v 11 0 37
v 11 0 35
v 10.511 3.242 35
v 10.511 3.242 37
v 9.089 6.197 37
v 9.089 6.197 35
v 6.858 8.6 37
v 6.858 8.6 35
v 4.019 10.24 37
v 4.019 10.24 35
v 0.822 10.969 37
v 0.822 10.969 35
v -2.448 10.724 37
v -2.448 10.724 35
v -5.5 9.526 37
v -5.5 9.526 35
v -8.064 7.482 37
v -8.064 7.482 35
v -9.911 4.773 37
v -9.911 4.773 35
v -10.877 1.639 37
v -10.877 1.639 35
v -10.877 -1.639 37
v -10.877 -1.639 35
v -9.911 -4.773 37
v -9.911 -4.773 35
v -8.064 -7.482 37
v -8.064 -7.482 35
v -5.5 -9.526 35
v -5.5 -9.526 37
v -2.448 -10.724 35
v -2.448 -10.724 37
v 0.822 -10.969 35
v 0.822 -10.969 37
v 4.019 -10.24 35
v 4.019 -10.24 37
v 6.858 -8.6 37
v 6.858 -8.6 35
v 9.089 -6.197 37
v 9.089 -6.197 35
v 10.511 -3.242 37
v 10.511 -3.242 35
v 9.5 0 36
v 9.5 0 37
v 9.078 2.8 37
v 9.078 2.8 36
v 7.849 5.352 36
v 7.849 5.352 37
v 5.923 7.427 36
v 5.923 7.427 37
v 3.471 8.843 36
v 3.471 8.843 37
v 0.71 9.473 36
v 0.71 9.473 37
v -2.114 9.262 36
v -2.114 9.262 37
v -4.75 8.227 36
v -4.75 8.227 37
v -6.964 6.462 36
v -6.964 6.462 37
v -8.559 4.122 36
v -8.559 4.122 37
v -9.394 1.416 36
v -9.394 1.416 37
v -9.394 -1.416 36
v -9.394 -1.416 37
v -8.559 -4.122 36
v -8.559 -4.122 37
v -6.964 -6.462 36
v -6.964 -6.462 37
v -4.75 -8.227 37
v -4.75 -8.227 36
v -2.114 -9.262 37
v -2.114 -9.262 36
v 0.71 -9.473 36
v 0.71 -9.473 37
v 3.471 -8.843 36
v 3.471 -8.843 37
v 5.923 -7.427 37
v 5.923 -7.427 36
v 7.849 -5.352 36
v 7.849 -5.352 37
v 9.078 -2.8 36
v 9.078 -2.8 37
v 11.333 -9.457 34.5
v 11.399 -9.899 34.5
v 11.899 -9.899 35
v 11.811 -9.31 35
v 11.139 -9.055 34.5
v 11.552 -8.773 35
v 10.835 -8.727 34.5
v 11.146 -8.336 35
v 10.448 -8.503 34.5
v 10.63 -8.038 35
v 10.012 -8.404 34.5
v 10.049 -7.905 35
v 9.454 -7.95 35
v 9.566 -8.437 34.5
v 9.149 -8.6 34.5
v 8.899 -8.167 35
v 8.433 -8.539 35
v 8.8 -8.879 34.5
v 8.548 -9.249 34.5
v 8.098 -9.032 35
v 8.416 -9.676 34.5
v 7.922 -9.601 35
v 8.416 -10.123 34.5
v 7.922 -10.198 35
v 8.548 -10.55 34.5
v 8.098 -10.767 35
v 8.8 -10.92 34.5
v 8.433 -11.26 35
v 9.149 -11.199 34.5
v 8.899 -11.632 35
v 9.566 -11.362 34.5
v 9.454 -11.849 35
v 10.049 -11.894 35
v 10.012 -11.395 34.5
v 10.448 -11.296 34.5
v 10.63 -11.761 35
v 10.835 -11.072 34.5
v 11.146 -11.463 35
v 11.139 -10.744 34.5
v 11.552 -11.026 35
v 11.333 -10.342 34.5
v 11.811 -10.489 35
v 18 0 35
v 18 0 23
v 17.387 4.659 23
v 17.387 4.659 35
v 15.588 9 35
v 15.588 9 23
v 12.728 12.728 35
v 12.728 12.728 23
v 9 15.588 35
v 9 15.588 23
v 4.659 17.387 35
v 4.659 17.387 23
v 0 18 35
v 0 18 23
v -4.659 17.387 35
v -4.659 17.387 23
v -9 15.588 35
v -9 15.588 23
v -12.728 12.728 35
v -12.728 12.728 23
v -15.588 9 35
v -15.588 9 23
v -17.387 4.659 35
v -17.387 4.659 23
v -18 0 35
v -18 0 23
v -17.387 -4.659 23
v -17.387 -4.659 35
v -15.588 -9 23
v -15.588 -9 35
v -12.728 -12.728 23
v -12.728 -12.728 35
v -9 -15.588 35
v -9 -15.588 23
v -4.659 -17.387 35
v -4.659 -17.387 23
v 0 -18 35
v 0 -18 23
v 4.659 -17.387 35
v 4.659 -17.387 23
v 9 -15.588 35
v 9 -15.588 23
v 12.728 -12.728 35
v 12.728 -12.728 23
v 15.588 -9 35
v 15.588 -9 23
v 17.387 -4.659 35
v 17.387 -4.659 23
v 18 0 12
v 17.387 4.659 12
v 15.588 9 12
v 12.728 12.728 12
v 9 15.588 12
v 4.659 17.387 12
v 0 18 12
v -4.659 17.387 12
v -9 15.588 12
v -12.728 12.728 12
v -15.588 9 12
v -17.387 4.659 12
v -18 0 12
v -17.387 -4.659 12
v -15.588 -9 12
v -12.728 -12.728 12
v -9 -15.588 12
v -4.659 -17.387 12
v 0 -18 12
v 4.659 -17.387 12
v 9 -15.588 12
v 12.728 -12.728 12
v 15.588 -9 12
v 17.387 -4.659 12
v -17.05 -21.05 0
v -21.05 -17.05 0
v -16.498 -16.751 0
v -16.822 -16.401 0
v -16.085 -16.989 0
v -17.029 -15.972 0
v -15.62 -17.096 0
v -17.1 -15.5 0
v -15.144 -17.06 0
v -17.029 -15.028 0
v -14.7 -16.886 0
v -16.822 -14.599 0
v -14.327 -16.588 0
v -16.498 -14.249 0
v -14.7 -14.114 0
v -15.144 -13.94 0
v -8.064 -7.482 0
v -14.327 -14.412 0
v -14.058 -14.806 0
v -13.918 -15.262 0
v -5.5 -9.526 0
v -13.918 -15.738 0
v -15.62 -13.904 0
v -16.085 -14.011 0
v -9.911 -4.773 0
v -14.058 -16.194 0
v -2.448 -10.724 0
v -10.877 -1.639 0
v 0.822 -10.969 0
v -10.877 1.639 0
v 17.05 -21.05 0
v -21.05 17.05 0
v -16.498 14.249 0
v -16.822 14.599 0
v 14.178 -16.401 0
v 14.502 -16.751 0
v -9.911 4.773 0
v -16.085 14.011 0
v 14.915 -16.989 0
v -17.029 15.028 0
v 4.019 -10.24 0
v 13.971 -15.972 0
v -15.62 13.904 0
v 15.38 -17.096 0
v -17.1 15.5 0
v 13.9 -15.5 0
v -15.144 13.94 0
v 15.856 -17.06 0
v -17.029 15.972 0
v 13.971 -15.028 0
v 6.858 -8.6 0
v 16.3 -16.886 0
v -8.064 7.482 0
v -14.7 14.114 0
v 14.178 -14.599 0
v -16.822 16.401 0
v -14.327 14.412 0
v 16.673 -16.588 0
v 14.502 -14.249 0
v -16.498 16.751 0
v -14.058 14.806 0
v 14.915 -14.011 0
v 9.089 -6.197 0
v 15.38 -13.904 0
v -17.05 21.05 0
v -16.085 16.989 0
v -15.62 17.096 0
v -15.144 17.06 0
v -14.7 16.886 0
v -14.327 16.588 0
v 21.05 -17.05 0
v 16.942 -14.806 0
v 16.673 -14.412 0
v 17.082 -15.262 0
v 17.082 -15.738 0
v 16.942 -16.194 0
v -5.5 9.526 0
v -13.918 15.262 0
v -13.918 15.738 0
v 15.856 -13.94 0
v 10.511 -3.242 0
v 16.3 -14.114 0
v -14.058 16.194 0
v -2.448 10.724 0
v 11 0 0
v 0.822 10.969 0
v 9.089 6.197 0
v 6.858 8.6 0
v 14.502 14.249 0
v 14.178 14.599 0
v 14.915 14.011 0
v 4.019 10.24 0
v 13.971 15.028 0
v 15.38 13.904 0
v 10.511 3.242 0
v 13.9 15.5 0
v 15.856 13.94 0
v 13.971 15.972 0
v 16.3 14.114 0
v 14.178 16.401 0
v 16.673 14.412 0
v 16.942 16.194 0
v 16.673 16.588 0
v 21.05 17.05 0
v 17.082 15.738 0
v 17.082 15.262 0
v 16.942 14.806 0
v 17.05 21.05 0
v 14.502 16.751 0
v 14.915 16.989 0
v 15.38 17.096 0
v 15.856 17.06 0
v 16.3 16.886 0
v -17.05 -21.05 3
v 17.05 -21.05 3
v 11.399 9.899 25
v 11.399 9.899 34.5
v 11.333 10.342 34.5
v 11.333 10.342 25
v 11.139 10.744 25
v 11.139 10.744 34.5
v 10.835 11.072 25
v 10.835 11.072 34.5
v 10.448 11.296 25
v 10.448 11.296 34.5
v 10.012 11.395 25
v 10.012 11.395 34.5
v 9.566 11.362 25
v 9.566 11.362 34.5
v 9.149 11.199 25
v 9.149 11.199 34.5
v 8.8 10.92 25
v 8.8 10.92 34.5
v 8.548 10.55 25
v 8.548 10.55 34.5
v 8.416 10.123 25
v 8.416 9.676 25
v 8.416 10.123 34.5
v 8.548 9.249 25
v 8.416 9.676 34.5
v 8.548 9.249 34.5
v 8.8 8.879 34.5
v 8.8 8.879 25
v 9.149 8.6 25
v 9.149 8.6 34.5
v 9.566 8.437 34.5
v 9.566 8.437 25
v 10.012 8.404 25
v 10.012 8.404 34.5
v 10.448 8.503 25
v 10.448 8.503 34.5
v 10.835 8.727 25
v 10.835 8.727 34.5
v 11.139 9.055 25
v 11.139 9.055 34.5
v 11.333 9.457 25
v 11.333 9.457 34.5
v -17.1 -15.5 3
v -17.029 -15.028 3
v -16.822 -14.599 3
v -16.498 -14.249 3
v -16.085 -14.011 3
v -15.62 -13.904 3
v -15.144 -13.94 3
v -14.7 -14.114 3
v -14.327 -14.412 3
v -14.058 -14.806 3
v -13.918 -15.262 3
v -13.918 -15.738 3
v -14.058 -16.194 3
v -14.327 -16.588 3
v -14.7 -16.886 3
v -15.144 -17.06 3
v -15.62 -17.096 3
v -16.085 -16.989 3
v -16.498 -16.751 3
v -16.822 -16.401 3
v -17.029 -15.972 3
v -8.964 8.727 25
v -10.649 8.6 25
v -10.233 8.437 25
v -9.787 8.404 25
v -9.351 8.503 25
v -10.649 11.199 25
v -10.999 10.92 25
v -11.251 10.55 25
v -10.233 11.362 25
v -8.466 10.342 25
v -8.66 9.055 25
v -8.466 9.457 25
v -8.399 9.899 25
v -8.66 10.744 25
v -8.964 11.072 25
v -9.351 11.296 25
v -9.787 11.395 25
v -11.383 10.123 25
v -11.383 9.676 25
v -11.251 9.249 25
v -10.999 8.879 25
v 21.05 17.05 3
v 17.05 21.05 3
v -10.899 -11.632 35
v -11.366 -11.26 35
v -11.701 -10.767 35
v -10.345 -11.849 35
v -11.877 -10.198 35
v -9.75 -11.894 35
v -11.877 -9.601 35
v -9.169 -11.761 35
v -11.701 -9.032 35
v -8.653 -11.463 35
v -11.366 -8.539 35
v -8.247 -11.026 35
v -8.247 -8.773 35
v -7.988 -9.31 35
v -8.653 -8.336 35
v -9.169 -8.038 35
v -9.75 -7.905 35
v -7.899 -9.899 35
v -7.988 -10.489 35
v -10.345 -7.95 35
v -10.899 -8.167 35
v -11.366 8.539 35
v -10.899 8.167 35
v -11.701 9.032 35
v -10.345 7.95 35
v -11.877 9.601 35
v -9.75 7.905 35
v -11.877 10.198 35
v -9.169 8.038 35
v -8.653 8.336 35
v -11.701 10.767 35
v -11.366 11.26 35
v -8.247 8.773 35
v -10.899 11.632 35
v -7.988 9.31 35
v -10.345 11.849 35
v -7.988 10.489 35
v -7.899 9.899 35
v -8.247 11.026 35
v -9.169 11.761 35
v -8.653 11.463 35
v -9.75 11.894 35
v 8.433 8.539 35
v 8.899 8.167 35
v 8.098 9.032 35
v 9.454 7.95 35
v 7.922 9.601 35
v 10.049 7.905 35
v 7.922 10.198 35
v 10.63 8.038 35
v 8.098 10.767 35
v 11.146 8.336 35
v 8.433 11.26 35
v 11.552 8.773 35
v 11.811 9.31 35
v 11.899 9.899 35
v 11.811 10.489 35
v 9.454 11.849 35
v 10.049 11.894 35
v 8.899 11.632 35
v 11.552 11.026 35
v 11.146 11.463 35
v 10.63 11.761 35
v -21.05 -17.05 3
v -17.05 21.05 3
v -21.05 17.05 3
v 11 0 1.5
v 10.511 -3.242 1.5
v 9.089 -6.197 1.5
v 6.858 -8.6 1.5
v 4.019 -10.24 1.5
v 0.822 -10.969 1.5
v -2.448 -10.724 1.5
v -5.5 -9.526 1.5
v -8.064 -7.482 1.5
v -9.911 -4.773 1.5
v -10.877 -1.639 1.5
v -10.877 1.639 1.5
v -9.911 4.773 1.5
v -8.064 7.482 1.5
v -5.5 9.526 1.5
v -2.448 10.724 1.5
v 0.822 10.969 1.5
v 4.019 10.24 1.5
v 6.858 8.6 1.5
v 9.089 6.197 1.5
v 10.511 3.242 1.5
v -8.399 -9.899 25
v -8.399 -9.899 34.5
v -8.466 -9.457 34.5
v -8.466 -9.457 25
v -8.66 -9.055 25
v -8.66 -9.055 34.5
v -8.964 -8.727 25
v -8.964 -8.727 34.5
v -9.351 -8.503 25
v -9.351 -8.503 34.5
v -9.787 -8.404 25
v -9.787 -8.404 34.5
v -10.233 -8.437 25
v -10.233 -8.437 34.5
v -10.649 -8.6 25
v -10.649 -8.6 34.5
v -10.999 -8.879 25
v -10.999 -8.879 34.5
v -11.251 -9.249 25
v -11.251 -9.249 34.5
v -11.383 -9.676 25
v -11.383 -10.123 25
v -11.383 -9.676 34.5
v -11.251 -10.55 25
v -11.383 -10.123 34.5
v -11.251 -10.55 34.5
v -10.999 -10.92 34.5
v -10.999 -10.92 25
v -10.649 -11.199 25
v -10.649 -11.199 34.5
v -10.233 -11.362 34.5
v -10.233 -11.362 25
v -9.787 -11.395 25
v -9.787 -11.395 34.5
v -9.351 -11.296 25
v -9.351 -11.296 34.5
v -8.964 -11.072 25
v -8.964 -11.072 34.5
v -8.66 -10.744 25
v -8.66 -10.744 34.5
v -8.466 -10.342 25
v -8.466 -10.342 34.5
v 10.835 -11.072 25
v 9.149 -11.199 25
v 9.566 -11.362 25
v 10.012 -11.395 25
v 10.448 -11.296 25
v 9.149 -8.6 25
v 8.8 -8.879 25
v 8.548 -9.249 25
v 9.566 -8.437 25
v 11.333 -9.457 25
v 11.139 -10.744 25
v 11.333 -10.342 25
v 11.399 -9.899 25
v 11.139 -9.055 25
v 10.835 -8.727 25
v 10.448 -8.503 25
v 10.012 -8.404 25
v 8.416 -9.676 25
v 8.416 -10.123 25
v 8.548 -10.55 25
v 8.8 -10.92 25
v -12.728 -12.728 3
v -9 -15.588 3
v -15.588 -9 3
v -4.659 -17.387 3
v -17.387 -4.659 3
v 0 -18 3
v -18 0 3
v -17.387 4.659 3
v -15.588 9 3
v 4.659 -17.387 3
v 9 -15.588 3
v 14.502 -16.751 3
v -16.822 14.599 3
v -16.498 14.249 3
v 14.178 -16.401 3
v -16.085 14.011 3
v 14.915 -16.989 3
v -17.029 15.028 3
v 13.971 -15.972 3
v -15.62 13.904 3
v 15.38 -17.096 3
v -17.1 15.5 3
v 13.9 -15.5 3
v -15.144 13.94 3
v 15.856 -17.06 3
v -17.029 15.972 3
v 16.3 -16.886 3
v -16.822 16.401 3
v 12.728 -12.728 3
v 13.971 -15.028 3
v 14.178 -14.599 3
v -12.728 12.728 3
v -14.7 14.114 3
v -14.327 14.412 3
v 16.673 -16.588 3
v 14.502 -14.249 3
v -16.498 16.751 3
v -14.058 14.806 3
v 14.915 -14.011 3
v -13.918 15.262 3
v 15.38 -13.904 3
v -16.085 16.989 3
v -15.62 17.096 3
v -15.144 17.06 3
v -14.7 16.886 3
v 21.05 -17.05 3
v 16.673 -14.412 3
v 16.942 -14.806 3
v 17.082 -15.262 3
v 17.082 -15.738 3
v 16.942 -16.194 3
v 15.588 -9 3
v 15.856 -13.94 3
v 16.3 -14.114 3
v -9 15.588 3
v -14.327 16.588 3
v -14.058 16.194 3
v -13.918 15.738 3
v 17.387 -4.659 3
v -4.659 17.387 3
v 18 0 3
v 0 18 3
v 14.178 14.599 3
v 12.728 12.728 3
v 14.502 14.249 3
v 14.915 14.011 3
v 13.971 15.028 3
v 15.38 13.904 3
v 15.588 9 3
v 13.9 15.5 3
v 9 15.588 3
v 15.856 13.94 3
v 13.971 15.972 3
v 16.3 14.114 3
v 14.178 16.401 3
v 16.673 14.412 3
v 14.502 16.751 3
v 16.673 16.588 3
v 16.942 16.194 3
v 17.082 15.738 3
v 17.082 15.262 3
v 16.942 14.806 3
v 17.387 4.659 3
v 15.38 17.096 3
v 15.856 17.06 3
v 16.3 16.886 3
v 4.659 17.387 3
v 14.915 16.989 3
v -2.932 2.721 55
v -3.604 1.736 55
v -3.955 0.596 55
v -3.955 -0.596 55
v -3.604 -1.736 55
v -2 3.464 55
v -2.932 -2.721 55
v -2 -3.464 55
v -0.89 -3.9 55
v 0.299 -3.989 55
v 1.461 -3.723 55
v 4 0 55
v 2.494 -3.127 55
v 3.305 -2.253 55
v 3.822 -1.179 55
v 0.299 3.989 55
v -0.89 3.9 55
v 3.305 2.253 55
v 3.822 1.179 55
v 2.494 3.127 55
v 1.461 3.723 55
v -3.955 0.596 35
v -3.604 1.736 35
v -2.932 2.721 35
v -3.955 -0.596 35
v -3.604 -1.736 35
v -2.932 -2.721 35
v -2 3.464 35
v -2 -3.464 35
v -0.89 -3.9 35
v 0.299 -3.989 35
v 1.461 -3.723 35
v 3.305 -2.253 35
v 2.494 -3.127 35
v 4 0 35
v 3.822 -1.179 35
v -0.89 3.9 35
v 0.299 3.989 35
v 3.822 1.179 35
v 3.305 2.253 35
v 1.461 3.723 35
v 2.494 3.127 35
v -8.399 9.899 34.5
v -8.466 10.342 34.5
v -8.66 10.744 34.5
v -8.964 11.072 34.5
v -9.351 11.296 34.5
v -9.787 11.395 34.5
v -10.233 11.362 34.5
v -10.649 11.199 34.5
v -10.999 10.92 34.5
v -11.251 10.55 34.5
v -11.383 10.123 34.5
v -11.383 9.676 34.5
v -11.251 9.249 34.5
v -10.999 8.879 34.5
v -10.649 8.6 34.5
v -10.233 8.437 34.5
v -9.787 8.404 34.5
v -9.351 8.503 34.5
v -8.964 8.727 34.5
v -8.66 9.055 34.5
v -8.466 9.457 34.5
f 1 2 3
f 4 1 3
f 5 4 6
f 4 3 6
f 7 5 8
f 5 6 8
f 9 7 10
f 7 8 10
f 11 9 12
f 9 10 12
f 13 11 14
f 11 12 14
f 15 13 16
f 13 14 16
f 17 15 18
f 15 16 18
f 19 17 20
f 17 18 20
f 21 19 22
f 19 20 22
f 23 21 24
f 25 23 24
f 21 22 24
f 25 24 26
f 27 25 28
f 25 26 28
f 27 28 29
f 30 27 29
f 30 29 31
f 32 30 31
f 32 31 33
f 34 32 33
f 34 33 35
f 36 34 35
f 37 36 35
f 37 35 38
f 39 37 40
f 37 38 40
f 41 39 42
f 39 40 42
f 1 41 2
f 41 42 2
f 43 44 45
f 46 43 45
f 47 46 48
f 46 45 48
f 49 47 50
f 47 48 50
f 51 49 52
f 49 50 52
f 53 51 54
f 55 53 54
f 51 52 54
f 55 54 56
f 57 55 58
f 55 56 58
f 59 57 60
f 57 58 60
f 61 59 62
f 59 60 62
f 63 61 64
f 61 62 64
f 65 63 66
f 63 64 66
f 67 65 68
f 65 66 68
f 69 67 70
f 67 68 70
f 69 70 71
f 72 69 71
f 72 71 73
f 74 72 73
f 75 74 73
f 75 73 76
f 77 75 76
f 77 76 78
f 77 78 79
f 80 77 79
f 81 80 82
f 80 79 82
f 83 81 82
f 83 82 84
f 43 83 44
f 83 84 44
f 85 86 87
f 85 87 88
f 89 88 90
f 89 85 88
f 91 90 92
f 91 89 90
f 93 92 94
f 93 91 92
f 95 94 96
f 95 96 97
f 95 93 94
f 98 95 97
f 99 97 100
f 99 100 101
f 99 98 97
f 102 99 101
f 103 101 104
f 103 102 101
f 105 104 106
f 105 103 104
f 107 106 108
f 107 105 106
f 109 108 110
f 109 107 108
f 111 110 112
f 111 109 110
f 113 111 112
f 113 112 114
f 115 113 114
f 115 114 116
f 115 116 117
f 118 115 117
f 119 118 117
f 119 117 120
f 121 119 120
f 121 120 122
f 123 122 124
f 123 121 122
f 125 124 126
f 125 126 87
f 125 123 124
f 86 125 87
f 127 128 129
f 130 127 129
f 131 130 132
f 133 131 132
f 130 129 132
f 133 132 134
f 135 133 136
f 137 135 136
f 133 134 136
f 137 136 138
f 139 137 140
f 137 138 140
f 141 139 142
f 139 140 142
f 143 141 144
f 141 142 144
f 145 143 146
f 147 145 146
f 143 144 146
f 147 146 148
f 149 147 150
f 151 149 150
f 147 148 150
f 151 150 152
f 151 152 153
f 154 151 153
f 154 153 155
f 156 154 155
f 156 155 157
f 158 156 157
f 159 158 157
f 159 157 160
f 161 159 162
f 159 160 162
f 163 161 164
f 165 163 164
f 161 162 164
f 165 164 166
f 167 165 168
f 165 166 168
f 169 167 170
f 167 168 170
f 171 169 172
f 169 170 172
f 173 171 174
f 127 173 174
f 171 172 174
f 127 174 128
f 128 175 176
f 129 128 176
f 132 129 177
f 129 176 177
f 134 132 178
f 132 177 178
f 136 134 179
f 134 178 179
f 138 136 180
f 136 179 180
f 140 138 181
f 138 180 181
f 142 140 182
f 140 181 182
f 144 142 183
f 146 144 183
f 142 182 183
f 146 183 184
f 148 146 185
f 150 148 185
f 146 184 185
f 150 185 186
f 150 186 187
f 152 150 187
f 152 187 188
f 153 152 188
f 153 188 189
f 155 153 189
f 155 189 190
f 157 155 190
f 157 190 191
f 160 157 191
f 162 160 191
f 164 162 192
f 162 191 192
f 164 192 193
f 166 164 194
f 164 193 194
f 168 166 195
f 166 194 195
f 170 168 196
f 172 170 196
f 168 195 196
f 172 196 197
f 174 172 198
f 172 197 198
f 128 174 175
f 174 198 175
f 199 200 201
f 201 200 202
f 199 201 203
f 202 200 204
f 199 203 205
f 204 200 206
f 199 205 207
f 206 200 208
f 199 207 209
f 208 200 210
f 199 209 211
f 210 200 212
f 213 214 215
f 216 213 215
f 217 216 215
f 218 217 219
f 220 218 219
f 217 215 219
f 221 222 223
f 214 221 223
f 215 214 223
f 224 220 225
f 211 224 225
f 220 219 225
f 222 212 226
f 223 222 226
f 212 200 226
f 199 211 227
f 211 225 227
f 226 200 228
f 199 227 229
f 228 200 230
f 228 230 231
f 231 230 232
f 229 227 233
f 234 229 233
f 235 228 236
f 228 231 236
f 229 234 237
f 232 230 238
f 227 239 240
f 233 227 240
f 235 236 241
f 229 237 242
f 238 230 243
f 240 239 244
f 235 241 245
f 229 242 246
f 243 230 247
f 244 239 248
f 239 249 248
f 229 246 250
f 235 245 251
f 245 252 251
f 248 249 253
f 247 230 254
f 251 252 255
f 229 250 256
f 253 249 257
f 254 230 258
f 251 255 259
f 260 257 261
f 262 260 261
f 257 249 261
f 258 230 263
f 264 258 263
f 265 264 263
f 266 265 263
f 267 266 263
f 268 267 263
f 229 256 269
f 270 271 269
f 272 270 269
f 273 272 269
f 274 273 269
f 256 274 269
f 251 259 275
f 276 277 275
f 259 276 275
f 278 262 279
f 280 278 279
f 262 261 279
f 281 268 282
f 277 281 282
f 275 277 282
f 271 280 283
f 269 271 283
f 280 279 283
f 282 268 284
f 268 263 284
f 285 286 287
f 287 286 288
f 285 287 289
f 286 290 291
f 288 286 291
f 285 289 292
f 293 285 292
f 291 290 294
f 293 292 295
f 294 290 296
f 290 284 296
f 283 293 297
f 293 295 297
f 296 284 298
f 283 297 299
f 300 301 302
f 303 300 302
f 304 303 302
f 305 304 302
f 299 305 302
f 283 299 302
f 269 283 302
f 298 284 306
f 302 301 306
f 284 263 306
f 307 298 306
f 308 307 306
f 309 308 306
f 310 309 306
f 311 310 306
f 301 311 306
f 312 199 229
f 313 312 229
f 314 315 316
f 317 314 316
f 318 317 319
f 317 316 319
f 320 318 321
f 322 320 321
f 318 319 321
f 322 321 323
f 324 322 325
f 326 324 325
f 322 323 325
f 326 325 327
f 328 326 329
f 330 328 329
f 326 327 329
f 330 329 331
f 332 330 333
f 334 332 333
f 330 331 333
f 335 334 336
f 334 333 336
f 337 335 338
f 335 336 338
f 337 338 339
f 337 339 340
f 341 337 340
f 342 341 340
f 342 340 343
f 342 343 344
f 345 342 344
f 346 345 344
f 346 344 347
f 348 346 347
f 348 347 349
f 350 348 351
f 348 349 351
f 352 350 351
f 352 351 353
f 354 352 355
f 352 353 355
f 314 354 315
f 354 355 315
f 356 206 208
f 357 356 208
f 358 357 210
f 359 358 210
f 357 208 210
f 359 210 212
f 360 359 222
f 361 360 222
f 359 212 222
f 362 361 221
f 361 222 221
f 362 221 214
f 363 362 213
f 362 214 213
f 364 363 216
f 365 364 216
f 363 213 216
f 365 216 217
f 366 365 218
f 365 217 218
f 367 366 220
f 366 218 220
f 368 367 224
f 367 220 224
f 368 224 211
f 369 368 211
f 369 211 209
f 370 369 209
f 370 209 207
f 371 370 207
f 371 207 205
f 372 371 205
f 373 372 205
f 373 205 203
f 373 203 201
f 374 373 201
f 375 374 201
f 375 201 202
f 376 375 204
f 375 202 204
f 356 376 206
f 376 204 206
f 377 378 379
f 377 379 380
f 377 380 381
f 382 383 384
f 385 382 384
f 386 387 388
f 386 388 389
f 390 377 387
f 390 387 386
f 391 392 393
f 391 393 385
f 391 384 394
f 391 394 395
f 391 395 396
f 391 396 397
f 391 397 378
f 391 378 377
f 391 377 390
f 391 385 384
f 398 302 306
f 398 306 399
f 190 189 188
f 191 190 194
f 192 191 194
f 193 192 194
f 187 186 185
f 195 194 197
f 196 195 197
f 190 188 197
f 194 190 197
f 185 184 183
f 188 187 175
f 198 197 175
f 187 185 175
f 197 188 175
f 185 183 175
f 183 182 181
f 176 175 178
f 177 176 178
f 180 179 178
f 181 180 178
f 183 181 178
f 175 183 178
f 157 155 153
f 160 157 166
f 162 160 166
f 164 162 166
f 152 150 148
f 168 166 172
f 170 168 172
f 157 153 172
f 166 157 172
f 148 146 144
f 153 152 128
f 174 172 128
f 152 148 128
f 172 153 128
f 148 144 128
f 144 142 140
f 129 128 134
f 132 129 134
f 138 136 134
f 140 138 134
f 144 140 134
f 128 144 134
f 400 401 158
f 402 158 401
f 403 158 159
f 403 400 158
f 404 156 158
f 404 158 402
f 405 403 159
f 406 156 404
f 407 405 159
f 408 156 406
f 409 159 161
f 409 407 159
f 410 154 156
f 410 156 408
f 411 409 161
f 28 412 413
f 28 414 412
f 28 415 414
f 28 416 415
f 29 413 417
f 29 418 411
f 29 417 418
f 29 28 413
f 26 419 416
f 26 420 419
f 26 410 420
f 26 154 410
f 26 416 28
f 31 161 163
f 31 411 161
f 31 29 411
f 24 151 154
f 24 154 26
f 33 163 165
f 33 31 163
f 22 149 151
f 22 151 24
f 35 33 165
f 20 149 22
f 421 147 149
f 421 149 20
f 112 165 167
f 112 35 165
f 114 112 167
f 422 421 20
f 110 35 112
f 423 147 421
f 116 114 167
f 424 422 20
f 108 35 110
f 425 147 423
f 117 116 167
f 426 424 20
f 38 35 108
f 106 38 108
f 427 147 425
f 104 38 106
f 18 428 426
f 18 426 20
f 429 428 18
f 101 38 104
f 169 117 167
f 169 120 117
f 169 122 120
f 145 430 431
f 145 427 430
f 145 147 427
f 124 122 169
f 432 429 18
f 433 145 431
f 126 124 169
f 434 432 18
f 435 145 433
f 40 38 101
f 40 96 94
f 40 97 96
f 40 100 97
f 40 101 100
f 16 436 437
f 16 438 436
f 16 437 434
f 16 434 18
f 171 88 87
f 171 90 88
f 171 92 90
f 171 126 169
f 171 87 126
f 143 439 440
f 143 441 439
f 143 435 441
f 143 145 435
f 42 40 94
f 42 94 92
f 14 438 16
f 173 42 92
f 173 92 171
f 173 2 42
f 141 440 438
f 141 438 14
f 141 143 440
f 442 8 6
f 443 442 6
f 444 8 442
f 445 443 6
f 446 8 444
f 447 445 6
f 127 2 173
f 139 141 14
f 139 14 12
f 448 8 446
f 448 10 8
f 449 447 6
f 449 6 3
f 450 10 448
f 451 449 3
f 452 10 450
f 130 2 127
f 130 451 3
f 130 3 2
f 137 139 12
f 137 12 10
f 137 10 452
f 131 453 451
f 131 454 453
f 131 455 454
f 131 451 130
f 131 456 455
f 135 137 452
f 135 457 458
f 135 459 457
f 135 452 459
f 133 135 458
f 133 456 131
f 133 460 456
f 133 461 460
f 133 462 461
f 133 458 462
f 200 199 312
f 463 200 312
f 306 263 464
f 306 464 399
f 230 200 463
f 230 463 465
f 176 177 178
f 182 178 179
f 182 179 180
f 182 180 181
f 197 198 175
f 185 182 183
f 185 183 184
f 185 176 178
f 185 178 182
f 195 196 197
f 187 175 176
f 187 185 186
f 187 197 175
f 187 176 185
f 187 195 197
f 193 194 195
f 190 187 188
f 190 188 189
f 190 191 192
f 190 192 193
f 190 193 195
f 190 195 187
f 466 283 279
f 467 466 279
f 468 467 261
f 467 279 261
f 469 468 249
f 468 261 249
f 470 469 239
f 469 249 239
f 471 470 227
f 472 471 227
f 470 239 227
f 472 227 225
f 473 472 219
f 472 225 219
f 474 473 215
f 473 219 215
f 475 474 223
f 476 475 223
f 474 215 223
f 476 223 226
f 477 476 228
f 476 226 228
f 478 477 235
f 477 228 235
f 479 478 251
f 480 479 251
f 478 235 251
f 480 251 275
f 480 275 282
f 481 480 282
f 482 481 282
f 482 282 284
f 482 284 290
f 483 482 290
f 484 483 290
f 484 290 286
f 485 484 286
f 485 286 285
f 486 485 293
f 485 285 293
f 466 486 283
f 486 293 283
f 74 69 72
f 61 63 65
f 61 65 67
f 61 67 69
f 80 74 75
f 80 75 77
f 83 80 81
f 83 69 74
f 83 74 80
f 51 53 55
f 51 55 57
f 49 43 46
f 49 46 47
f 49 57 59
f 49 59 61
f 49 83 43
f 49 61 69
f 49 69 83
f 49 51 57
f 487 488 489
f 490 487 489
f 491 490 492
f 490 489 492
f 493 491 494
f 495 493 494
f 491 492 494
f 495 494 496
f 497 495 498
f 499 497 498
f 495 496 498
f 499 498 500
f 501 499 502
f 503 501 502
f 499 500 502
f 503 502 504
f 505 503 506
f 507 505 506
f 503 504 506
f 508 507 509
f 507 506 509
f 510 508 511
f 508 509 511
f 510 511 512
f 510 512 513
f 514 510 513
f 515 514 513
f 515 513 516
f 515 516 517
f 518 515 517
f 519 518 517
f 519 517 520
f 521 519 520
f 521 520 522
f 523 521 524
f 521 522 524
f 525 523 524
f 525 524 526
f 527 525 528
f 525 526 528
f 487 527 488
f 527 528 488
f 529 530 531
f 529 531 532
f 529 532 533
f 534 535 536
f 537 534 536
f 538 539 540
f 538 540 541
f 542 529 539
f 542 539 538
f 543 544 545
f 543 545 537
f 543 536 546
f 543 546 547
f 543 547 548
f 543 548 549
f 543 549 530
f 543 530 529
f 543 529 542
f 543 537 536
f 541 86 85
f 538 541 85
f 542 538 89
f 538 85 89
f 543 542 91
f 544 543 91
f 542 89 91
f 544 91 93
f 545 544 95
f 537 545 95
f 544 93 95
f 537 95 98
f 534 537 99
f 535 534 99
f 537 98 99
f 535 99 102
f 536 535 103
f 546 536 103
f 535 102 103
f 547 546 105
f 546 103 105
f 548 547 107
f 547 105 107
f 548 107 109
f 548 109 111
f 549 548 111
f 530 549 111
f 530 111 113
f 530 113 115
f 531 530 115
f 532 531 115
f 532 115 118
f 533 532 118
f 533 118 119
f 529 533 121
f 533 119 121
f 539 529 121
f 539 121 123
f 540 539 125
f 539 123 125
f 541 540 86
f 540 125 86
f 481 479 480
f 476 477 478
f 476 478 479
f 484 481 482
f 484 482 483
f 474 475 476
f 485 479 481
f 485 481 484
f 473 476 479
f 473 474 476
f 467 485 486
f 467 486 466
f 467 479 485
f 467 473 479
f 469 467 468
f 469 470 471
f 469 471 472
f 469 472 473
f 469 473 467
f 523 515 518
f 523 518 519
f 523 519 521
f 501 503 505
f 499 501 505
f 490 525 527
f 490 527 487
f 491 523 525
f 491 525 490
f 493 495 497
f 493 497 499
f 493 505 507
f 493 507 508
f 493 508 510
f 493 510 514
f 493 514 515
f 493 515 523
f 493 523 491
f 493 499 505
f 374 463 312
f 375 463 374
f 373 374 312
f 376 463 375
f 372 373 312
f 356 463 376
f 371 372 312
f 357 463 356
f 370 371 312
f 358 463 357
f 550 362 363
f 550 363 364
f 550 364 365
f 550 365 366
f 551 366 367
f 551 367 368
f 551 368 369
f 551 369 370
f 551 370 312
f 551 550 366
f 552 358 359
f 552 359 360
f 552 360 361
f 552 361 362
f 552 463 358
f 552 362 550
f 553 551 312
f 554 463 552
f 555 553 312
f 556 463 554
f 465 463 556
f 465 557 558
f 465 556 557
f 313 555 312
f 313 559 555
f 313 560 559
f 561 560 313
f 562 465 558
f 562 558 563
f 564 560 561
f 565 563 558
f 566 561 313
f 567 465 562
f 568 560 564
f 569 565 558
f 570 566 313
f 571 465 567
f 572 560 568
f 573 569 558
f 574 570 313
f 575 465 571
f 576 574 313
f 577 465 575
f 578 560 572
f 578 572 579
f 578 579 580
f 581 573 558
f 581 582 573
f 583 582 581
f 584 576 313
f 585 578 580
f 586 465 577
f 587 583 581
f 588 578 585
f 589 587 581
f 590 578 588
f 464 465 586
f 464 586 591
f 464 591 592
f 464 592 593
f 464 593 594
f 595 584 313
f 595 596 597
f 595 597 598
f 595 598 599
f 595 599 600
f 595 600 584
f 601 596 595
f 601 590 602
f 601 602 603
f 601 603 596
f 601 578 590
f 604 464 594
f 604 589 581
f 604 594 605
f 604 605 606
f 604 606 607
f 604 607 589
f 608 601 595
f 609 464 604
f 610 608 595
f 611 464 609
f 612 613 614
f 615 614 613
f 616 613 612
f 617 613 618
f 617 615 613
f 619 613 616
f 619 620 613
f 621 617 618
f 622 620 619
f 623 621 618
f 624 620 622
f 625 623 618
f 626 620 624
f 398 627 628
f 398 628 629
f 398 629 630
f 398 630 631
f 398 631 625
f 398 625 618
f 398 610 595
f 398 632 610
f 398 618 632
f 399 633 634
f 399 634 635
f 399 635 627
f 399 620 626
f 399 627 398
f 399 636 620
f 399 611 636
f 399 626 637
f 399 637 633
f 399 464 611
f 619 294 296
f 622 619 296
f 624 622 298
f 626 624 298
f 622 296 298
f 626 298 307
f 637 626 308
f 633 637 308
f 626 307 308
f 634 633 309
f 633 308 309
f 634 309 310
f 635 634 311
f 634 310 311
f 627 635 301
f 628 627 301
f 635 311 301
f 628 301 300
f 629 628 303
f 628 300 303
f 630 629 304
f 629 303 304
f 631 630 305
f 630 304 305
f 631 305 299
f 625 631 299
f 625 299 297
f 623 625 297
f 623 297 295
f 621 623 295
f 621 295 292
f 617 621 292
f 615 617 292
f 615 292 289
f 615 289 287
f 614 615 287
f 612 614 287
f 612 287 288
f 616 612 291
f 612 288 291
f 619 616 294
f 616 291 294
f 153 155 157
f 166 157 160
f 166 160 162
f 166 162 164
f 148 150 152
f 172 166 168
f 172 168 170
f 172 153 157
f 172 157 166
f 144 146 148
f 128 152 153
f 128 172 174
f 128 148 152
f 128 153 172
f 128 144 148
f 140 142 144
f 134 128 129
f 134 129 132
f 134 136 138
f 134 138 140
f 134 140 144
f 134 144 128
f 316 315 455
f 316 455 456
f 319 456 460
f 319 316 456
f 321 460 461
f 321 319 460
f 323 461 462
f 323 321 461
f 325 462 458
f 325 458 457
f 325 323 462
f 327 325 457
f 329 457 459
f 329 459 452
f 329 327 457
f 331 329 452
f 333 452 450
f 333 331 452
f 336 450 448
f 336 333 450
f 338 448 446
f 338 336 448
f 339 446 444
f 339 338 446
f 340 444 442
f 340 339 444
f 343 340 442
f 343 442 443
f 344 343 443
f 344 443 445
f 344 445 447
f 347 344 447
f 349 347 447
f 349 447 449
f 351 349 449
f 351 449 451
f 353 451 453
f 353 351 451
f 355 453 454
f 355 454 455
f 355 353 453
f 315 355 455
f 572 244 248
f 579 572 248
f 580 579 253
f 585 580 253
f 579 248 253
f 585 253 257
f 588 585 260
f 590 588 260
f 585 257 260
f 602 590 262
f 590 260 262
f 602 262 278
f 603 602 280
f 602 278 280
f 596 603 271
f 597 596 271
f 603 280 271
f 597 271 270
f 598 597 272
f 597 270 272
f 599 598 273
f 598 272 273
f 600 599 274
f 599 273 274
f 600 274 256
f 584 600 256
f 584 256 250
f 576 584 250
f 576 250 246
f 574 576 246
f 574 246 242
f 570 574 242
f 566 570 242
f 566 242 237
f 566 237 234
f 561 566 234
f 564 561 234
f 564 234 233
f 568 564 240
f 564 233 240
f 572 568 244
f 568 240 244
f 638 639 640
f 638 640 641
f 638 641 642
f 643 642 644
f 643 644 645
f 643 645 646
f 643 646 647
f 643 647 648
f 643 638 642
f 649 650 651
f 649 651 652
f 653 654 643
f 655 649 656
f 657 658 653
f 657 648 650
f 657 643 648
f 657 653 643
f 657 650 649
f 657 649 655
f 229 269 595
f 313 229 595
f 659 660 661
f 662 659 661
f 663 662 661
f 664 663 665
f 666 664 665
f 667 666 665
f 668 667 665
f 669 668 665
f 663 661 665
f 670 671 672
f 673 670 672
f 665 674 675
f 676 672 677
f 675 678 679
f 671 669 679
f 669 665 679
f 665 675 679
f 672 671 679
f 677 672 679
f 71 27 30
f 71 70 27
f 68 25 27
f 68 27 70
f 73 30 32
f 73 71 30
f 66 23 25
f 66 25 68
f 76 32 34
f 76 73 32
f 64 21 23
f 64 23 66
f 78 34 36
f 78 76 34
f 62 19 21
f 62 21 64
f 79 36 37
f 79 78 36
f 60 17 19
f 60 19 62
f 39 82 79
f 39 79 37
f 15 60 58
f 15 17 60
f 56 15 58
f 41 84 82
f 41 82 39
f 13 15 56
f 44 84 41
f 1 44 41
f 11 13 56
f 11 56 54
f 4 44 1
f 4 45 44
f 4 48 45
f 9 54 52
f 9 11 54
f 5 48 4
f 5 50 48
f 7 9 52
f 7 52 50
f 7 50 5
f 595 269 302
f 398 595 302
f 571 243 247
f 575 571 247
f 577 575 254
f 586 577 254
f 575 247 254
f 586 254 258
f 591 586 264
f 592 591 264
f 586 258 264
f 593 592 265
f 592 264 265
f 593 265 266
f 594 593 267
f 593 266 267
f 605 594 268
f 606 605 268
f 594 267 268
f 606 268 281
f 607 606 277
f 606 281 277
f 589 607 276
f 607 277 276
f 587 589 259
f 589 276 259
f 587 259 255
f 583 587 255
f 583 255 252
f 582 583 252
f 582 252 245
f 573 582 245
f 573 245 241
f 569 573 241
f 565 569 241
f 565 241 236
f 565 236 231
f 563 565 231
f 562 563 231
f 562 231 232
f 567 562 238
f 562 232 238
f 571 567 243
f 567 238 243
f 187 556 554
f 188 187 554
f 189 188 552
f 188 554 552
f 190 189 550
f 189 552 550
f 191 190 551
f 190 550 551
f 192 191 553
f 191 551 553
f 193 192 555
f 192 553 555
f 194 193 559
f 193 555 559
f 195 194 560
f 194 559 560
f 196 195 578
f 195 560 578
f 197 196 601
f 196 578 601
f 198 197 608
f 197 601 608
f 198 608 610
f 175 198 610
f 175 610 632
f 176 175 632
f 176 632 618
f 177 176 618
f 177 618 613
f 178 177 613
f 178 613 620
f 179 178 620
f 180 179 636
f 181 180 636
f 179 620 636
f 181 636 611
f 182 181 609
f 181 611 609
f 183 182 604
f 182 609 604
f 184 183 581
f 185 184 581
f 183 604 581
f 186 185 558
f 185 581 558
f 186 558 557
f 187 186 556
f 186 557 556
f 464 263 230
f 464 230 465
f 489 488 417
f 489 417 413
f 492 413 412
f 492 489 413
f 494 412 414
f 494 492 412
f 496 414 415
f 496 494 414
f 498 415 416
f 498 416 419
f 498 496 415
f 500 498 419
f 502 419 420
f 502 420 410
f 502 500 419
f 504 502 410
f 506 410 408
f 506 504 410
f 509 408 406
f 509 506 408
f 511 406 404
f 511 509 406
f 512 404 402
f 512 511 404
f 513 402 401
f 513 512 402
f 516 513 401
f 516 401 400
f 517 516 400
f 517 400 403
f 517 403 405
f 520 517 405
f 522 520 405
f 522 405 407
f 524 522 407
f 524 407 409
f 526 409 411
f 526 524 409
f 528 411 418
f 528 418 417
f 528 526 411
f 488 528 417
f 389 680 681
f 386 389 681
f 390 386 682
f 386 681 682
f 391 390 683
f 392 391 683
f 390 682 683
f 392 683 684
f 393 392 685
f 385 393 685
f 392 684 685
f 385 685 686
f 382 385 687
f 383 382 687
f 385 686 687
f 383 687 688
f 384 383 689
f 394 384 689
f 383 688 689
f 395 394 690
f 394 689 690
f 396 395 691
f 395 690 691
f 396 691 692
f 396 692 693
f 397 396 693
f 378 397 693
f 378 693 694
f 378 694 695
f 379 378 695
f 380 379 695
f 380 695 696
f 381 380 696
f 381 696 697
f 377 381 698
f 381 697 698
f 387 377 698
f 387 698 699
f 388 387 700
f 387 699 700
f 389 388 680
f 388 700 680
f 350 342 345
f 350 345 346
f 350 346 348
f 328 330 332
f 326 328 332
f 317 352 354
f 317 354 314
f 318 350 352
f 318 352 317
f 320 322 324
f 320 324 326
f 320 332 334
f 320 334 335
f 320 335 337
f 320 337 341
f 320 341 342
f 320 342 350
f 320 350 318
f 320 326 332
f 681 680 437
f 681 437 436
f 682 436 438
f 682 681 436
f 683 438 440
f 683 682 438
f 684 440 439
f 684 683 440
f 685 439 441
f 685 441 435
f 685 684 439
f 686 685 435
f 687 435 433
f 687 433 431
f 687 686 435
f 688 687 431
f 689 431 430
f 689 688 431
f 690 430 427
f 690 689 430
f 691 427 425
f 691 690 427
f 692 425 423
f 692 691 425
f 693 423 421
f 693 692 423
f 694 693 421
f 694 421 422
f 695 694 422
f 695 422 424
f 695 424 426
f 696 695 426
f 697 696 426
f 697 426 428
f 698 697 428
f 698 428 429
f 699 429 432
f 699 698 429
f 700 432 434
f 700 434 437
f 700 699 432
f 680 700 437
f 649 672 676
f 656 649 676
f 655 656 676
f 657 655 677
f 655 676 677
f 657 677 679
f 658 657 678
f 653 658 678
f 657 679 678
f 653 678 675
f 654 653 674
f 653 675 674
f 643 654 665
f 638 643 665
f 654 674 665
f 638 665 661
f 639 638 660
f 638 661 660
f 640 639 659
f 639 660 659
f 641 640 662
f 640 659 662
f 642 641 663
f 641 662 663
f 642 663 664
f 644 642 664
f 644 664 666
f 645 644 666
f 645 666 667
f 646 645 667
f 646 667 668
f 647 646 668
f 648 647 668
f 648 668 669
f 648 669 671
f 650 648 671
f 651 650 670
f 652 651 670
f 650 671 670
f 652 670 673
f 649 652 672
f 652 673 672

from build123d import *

# Parameters (mm, degrees)
SKETCH1_W           = 42.1
SKETCH1_H           = 42.1
BOSS_EXTRUDE2_DEPTH = 3
SKETCH3_R           = 18
BOSS_EXTRUDE3_DEPTH = 9
SKETCH4_R           = 18
BOSS_EXTRUDE4_DEPTH = 11
SKETCH5_R           = 18
BOSS_EXTRUDE5_DEPTH = 12
SKETCH6_R           = 11
BOSS_EXTRUDE6_DEPTH = 2
SKETCH9_R           = 9.5
CUT_EXTRUDE2_DEPTH  = 1
SKETCH7_R           = 4
BOSS_EXTRUDE7_DEPTH = 20
SKETCH10_R          = 1.6
CUT_EXTRUDE3_DEPTH  = 3
SKETCH12_R          = 1.5
CUT_EXTRUDE5_DEPTH  = 10
CHAMFER1_SIZE       = 4
CHAMFER2_SIZE       = 0.5
SKETCH15_R          = 11
CUT_EXTRUDE8_DEPTH  = 1.5


with BuildPart() as part:
    # Sketch1 → Boss-Extrude2 (new body)
    with BuildSketch(Plane.XY):
        Rectangle(SKETCH1_W, SKETCH1_H)
    extrude(amount=BOSS_EXTRUDE2_DEPTH)

    # Sketch3 → Boss-Extrude3 (add)
    with BuildSketch(Plane.XY.offset(3)):
        with Locations(Location((0, 0, 0), (0, 0, 180))):
            Circle(SKETCH3_R)
    extrude(amount=BOSS_EXTRUDE3_DEPTH)

    # Sketch10 → Cut-Extrude3 (cut)
    with BuildSketch(Plane(origin=(0, 0, 0), x_dir=(-1, 0, 0), z_dir=(0, 0, -1))):
        with Locations((-15.5, 15.5)):
            Circle(SKETCH10_R)
        with Locations((15.5, 15.5)):
            Circle(SKETCH10_R)
        with Locations((15.5, -15.5)):
            Circle(SKETCH10_R)
        with Locations((-15.5, -15.5)):
            Circle(SKETCH10_R)
    extrude(amount=-CUT_EXTRUDE3_DEPTH, mode=Mode.SUBTRACT)

    # Chamfer1
    chamfer1_edges = [part.edges().sort_by_distance(p)[0] for p in [
        (-21.05, 21.05, 1.5),
        (21.05, 21.05, 1.5),
        (21.05, -21.05, 1.5),
        (-21.05, -21.05, 1.5),
    ]]
    chamfer(chamfer1_edges, length=CHAMFER1_SIZE)

    # Sketch15 → Cut-Extrude8 (cut)
    with BuildSketch(Plane(origin=(0, 0, 0), x_dir=(-1, 0, 0), z_dir=(0, 0, -1))):
        with Locations(Location((0, 0, 0), (0, 0, 180))):
            Circle(SKETCH15_R)
    extrude(amount=-CUT_EXTRUDE8_DEPTH, mode=Mode.SUBTRACT)


with BuildPart() as body_2:
    # Sketch4 → Boss-Extrude4 (new body)
    with BuildSketch(Plane.XY.offset(12)):
        Circle(SKETCH4_R)
    extrude(amount=BOSS_EXTRUDE4_DEPTH)


with BuildPart() as body_3:
    # Sketch5 → Boss-Extrude5 (new body)
    with BuildSketch(Plane.XY.offset(23)):
        Circle(SKETCH5_R)
    extrude(amount=BOSS_EXTRUDE5_DEPTH)

    # Sketch6 → Boss-Extrude6 (add)
    with BuildSketch(Plane.XY.offset(35)):
        Circle(SKETCH6_R)
    extrude(amount=BOSS_EXTRUDE6_DEPTH)

    # Sketch9 → Cut-Extrude2 (cut)
    with BuildSketch(Plane.XY.offset(37)):
        Circle(SKETCH9_R)
    extrude(amount=-CUT_EXTRUDE2_DEPTH, mode=Mode.SUBTRACT)

    # Sketch12 → Cut-Extrude5 (cut)
    with BuildSketch(Plane.XY.offset(35)):
        with Locations((-9.899494937, 9.899494937)):
            Circle(SKETCH12_R)
        with Locations((9.899494937, 9.899494937)):
            Circle(SKETCH12_R)
        with Locations((9.899494937, -9.899494937)):
            Circle(SKETCH12_R)
        with Locations((-9.899494937, -9.899494937)):
            Circle(SKETCH12_R)
    extrude(amount=-CUT_EXTRUDE5_DEPTH, mode=Mode.SUBTRACT)

    # Chamfer2
    chamfer2_edges = [body_3.edges().sort_by_distance(p)[0] for p in [
        (-11.399494937, -9.899494937, 35),
        (8.399494937, -9.899494937, 35),
        (8.399494937, 9.899494937, 35),
        (-11.399494937, 9.899494937, 35),
    ]]
    chamfer(chamfer2_edges, length=CHAMFER2_SIZE)


with BuildPart() as body_4:
    # Sketch7 → Boss-Extrude7 (new body)
    with BuildSketch(Plane.XY.offset(35)):
        Circle(SKETCH7_R)
    extrude(amount=BOSS_EXTRUDE7_DEPTH)


solid = Compound([part.part, body_2.part, body_3.part, body_4.part])
